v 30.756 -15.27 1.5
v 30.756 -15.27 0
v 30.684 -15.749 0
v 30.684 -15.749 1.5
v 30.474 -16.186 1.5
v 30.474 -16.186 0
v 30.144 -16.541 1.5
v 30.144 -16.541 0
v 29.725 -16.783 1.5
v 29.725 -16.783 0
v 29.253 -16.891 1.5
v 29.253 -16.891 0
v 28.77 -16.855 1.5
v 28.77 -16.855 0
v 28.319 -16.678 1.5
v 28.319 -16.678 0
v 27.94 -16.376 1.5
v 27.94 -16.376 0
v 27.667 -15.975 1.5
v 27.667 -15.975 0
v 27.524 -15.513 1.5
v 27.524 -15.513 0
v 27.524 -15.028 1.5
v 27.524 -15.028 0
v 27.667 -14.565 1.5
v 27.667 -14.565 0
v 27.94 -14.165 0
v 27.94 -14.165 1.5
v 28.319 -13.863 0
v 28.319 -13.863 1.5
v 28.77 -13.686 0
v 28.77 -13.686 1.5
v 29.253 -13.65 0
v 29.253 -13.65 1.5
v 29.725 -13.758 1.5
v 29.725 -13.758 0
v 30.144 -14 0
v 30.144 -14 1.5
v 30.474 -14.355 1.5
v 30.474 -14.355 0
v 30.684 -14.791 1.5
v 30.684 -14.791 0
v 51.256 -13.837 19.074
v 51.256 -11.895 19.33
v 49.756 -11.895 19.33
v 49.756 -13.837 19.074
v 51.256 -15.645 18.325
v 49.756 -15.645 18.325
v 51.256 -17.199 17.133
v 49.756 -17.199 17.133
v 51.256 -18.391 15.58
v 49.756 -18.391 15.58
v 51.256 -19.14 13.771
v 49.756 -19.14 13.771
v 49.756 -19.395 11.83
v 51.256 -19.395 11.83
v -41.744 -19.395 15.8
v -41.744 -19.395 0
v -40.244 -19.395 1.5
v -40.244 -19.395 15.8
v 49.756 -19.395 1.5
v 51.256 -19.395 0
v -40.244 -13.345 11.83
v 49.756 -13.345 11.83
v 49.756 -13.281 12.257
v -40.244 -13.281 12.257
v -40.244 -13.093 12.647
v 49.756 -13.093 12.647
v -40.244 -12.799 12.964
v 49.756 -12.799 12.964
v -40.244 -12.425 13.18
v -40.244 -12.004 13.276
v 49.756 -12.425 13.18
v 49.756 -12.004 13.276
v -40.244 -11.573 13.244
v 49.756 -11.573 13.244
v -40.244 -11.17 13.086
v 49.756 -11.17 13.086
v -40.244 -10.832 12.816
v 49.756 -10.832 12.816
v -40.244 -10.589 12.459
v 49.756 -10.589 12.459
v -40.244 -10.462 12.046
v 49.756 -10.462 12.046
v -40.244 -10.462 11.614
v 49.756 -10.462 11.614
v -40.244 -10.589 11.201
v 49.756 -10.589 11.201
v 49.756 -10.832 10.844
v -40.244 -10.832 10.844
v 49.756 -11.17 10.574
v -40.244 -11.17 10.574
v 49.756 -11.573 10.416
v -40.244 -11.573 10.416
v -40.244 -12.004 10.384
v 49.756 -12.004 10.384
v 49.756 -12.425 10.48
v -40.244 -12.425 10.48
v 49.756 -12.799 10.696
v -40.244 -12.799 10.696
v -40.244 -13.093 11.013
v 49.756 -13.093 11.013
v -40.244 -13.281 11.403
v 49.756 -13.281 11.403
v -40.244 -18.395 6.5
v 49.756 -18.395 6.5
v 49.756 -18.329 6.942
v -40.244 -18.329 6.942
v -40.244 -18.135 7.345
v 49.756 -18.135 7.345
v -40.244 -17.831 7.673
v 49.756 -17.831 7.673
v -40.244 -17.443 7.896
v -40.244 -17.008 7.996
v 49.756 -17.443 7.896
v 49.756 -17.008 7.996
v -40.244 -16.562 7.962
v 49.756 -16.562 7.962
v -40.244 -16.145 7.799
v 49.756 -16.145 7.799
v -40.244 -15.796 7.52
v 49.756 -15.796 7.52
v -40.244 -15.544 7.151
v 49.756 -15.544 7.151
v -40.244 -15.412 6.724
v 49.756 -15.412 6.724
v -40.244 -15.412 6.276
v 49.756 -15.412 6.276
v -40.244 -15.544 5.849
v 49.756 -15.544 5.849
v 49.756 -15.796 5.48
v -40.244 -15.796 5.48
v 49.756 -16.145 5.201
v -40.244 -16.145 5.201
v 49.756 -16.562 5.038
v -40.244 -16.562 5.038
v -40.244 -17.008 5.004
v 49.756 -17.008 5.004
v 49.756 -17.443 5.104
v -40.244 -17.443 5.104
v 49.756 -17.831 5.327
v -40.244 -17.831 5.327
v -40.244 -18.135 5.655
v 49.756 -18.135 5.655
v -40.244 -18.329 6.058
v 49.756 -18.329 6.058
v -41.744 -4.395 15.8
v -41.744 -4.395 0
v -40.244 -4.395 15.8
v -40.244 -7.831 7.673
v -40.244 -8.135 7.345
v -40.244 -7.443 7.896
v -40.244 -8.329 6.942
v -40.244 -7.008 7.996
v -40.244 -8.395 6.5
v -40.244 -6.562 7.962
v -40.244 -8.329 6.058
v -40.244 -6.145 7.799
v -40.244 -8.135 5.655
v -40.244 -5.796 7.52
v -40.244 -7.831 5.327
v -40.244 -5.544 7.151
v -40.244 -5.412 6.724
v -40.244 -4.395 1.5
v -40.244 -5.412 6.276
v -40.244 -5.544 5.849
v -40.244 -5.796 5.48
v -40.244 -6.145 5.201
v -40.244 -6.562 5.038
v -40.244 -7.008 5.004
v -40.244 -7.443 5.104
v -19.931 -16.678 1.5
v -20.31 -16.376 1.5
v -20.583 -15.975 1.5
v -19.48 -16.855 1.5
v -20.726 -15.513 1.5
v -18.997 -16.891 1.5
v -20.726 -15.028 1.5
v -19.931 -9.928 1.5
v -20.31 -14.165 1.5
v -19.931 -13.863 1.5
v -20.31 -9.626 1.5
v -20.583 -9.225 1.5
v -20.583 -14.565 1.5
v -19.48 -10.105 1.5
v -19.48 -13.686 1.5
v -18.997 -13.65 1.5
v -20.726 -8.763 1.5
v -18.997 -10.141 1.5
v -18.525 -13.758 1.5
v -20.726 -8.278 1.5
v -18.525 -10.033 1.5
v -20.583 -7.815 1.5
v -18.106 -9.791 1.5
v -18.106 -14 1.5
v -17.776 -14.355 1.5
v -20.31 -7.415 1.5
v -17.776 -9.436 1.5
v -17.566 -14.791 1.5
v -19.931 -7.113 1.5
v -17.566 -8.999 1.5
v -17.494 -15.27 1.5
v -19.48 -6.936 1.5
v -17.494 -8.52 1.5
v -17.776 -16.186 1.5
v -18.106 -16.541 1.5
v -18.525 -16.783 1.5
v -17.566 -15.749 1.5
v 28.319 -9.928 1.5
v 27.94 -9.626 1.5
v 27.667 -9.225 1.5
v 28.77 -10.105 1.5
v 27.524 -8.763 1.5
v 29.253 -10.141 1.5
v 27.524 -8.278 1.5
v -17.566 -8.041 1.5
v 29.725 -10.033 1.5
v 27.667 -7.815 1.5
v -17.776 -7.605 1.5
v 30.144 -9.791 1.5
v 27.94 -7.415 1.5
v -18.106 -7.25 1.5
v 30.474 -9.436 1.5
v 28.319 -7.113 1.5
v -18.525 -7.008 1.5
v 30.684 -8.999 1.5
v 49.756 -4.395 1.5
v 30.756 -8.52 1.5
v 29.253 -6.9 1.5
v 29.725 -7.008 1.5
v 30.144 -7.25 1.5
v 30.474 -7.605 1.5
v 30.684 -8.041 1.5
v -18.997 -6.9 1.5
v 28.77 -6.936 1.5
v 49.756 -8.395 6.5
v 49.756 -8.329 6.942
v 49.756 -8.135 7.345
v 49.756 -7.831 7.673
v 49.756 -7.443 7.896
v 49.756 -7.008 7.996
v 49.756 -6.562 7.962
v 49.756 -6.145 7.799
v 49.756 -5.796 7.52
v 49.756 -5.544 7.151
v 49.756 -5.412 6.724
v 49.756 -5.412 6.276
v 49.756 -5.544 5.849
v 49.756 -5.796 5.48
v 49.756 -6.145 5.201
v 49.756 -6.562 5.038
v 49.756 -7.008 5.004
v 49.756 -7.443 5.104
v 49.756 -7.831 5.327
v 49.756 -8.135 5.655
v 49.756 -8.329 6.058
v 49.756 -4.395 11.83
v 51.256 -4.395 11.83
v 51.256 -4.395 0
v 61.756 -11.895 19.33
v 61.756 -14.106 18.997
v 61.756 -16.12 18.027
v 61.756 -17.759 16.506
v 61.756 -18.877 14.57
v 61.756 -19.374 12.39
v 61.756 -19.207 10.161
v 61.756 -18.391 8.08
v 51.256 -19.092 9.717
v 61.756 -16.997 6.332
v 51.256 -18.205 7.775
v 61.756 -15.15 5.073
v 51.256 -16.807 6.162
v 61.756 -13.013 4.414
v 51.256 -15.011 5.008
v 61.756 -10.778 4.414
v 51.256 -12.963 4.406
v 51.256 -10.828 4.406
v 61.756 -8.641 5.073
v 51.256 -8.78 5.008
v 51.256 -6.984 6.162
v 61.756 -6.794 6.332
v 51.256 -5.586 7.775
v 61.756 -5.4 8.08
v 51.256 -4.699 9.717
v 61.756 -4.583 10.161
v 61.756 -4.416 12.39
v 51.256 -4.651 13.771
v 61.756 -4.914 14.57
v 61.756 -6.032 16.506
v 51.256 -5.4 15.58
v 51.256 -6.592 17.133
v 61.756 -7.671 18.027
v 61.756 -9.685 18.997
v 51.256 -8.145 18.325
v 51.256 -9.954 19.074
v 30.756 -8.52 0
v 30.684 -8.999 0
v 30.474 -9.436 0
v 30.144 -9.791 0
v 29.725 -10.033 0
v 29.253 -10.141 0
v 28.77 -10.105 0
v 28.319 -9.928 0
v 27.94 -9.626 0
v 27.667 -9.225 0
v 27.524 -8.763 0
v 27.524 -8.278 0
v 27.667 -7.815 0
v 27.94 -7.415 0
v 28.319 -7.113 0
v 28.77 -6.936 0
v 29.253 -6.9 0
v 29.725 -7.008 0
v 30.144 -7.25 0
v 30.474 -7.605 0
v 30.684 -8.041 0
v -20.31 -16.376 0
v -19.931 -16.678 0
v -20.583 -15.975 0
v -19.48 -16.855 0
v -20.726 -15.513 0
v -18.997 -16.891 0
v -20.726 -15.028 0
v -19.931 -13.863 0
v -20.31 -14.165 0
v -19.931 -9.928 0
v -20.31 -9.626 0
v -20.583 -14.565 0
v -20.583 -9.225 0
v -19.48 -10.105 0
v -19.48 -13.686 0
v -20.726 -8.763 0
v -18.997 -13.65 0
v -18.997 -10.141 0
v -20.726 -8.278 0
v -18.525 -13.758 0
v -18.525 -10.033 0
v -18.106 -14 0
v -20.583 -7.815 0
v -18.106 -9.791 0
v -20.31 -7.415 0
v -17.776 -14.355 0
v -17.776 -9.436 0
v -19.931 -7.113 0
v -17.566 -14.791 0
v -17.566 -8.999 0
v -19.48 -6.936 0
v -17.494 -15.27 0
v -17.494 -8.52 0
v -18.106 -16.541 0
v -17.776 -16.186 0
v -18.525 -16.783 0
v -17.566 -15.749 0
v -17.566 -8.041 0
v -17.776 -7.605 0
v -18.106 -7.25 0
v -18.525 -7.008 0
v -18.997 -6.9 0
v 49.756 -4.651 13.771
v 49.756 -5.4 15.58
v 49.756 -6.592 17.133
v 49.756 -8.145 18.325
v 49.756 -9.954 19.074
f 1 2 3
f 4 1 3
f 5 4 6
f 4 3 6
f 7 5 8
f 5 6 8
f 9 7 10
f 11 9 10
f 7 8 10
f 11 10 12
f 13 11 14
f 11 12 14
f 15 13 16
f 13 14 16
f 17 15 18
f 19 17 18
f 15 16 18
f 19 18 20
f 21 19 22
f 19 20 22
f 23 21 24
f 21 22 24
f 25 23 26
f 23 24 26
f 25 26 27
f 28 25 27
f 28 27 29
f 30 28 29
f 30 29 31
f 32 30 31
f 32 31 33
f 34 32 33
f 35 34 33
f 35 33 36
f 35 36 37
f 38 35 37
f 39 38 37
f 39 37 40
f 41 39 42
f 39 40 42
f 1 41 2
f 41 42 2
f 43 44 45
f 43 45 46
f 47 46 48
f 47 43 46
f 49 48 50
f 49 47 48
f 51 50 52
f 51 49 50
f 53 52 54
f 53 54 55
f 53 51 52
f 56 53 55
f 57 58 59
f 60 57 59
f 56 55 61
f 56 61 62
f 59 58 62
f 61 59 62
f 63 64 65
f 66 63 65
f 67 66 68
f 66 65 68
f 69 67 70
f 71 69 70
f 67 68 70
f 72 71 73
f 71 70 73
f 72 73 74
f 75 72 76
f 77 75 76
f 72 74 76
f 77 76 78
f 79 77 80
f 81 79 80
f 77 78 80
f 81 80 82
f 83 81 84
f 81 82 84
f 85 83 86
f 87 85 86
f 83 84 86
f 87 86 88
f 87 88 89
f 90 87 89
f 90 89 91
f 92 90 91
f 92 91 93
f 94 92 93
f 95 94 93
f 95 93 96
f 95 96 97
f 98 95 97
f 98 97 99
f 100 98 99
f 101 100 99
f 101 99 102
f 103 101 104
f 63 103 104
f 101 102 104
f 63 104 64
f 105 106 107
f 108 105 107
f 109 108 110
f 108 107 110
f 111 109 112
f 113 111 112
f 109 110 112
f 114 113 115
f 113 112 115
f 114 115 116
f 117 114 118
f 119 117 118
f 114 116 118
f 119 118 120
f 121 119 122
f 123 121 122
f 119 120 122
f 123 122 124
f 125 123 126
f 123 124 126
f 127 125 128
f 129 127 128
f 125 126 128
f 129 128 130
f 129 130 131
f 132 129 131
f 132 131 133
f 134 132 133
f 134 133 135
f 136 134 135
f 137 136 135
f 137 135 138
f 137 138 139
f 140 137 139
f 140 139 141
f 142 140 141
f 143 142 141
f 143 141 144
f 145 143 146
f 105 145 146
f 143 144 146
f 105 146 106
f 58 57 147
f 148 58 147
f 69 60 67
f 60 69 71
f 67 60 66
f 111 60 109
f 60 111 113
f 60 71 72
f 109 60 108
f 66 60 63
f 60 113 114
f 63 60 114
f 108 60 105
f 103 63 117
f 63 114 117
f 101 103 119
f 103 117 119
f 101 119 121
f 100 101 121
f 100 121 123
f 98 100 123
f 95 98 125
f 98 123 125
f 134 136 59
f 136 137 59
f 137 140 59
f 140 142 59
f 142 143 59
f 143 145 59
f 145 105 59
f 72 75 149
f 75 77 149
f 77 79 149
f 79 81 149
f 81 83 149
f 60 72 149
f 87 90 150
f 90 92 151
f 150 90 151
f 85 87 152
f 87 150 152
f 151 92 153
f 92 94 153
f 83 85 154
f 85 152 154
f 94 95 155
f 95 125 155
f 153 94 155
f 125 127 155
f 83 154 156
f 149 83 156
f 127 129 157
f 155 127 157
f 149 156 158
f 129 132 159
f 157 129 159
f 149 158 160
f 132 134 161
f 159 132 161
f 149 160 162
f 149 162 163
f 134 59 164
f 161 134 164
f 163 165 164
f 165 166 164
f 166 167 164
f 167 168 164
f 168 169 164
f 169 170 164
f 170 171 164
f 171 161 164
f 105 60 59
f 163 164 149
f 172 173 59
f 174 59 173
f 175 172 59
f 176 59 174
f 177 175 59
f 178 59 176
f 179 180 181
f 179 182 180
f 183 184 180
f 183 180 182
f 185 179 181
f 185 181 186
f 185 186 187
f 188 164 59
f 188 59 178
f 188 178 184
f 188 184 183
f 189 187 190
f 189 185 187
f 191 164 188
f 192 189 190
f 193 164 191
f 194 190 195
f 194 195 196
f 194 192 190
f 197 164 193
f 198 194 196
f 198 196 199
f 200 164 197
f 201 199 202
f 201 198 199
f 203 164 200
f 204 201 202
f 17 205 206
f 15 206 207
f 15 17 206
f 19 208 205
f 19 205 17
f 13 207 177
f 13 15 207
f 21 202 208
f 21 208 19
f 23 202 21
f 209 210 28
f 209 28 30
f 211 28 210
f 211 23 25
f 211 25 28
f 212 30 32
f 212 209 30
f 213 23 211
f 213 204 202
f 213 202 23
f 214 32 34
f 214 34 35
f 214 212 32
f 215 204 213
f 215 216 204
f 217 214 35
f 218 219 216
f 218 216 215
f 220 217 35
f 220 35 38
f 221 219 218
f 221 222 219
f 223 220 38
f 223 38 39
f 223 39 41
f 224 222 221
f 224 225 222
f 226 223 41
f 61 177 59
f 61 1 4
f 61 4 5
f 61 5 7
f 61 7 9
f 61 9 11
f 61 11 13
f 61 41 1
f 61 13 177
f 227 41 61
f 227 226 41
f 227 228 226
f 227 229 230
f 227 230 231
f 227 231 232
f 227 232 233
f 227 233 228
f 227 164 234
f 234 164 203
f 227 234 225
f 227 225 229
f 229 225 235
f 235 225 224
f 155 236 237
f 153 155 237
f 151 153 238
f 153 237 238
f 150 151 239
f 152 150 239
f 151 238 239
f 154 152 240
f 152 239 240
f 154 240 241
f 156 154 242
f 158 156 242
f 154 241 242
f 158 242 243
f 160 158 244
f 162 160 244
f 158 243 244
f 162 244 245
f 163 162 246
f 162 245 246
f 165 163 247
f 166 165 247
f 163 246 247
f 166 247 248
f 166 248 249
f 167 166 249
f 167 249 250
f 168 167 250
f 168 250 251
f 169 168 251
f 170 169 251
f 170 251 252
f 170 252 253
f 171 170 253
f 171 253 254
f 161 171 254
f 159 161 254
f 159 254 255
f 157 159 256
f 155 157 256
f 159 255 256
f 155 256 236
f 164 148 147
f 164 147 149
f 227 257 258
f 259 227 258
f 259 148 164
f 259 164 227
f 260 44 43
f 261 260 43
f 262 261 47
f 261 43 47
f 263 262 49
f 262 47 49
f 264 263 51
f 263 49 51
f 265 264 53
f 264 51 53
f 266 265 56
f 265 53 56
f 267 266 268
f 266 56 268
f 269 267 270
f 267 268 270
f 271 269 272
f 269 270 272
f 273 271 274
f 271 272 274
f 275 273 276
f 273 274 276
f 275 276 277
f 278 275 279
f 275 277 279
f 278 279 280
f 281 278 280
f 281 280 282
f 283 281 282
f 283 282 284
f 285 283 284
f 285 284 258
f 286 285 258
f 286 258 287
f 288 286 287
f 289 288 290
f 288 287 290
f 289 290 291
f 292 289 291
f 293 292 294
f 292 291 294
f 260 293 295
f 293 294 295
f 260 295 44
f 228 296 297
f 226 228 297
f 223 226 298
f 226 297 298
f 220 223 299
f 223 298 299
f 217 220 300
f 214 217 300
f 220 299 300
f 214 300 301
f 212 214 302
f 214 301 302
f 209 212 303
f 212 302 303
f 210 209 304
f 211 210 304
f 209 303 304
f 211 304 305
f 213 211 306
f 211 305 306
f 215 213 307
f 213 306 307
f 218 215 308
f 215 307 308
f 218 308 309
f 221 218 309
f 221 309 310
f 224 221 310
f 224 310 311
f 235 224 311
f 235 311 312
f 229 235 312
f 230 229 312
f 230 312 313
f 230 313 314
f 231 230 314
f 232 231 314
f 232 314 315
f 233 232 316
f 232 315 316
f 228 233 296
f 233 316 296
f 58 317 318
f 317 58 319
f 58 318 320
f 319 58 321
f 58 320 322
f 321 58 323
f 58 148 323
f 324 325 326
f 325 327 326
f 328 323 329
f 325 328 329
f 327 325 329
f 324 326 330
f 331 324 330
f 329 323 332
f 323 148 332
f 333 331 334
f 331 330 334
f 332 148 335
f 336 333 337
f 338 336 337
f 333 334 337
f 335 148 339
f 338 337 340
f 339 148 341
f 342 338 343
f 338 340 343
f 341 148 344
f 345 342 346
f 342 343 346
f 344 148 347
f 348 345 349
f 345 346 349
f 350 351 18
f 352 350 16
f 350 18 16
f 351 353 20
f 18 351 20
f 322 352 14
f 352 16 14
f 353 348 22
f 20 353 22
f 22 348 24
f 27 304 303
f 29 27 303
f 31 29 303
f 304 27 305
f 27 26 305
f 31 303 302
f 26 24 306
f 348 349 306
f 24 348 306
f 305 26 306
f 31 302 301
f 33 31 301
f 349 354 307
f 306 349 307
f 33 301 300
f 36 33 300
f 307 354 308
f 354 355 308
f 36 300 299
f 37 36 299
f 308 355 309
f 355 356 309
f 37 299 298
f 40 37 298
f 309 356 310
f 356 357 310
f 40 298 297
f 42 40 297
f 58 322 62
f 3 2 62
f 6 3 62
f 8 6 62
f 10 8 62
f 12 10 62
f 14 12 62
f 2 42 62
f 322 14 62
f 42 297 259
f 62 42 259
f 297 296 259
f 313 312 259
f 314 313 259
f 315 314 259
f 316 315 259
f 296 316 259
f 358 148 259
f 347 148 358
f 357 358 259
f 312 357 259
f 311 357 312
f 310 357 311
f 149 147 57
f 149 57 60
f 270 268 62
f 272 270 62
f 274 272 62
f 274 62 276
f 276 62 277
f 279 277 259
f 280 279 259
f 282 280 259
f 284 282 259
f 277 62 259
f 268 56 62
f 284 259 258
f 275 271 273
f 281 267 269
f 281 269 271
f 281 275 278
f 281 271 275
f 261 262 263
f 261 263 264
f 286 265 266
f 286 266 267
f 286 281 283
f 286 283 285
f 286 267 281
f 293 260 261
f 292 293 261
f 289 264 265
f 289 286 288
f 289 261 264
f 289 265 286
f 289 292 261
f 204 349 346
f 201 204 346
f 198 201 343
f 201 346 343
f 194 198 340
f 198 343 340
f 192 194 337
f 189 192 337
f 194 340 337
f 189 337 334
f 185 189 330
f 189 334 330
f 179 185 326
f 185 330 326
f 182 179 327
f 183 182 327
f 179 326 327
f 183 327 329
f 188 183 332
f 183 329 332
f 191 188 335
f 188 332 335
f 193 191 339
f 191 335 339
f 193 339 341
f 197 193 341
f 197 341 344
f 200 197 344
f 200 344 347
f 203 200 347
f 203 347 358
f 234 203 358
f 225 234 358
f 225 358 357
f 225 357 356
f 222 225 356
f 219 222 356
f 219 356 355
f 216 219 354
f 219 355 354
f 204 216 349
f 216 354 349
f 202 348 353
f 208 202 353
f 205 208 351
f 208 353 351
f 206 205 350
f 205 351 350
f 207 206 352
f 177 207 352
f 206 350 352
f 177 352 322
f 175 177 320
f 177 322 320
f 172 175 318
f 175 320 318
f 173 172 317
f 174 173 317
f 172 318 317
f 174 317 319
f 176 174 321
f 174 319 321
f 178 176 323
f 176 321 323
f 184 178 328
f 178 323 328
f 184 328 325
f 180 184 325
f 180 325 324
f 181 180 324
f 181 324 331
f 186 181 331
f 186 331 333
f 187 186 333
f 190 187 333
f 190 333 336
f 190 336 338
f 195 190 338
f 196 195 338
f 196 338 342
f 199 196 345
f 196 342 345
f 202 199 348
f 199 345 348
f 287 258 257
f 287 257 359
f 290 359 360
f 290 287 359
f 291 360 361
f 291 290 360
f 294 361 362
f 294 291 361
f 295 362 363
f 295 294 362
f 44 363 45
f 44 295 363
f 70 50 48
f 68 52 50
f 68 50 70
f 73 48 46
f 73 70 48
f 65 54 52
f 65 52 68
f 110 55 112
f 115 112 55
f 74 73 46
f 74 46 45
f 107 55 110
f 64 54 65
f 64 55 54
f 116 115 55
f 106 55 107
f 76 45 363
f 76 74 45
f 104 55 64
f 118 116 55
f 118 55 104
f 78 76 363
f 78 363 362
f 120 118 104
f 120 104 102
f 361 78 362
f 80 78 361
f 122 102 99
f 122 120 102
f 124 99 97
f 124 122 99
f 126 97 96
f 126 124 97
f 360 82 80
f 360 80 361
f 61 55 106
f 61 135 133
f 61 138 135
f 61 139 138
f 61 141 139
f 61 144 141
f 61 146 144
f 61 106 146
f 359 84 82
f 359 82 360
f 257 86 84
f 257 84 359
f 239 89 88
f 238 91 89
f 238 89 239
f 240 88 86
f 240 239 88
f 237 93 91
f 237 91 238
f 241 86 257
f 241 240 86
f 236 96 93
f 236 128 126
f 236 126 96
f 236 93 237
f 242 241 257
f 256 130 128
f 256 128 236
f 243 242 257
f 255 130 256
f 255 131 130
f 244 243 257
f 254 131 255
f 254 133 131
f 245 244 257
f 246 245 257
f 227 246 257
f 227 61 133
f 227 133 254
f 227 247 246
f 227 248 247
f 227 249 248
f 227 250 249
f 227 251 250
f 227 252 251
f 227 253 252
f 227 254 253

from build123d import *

# Parameters (mm, degrees)
F0_W      = 93
F0_H      = 15
F1_DEPTH  = 1.5
F2_W      = 1.5
F2_H      = 15
F3_DEPTH  = 14.3
F4_DEPTH  = 17.83
F6_DEPTH  = 10.5
F7_DEPTH  = 1.5
F8_R      = 1.5
F8_R_2    = 1.45
F9_DEPTH  = 90
F10_R     = 1.625
F11_DEPTH = 1.5


with BuildPart() as f1:
    # F0 (on Top) → F1 (new body)
    with BuildSketch(Plane.XY):
        with Locations((4.7561880201, -11.8954138505)):
            Rectangle(F0_W, F0_H)
    extrude(amount=F1_DEPTH)

    # F2 (on face) → F3 (join)
    with BuildSketch(Plane.XY.offset(1.5)):
        with Locations((-40.9938119799, -11.8954138505)):
            Rectangle(F2_W, F2_H)
    extrude(amount=F3_DEPTH)

    # F2 (on face) → F4 (join)
    with BuildSketch(Plane.XY.offset(1.5)):
        with Locations((50.5061880201, -11.8954138505)):
            Rectangle(F2_W, F2_H)
    extrude(amount=F4_DEPTH)

    # F5 (on face) → F6 (join)
    with BuildSketch(Plane.YZ.offset(51.2561880201)):
        with BuildLine():
            ThreePointArc((-19.3954138505, 11.83), (-11.8954138505, 4.33), (-4.3954138505, 11.83))
            ThreePointArc((-4.3954138505, 11.83), (-6.5921129916, 17.1333008589), (-11.8954138505, 19.33))
            ThreePointArc((-11.8954138505, 19.33), (-17.1987147094, 17.1333008589), (-19.3954138505, 11.83))
        make_face()
    extrude(amount=F6_DEPTH)

    # F7 (cut, through all): faces of the model
    f7_faces = [f1.faces().sort_by_distance(p)[0] for p in [
        (51.2561880201, -6.0706733926, 17.6547404579),
        (51.2561880201, -17.7201543084, 17.6547404579),
    ]]
    extrude(f7_faces, amount=-F7_DEPTH, mode=Mode.SUBTRACT)

    # F8 (on face) → F9 (join, through all)
    with BuildSketch(Plane(origin=(49.7561880201, 0, 0), x_dir=(0, -1, 0), z_dir=(-1, 0, 0))):
        with Locations((6.8954138505, 6.5)):
            Circle(F8_R)
        with Locations((11.8954138505, 11.83)):
            Circle(F8_R_2)
        with Locations((16.8954138505, 6.5)):
            Circle(F8_R)
    extrude(amount=F9_DEPTH)

    # F10 (on face) → F11 (cut, through all)
    with BuildSketch(Plane(origin=(0, 0, 0), x_dir=(1, 0, 0), z_dir=(0, 0, -1))):
        with Locations((-19.1188119799, 15.2704138505)):
            Circle(F10_R)
        with Locations((-19.1188119799, 8.5204138505)):
            Circle(F10_R)
        with Locations((29.1311880201, 8.5204138505)):
            Circle(F10_R)
        with Locations((29.1311880201, 15.2704138505)):
            Circle(F10_R)
    extrude(amount=-F11_DEPTH, mode=Mode.SUBTRACT)


solid = f1.part
